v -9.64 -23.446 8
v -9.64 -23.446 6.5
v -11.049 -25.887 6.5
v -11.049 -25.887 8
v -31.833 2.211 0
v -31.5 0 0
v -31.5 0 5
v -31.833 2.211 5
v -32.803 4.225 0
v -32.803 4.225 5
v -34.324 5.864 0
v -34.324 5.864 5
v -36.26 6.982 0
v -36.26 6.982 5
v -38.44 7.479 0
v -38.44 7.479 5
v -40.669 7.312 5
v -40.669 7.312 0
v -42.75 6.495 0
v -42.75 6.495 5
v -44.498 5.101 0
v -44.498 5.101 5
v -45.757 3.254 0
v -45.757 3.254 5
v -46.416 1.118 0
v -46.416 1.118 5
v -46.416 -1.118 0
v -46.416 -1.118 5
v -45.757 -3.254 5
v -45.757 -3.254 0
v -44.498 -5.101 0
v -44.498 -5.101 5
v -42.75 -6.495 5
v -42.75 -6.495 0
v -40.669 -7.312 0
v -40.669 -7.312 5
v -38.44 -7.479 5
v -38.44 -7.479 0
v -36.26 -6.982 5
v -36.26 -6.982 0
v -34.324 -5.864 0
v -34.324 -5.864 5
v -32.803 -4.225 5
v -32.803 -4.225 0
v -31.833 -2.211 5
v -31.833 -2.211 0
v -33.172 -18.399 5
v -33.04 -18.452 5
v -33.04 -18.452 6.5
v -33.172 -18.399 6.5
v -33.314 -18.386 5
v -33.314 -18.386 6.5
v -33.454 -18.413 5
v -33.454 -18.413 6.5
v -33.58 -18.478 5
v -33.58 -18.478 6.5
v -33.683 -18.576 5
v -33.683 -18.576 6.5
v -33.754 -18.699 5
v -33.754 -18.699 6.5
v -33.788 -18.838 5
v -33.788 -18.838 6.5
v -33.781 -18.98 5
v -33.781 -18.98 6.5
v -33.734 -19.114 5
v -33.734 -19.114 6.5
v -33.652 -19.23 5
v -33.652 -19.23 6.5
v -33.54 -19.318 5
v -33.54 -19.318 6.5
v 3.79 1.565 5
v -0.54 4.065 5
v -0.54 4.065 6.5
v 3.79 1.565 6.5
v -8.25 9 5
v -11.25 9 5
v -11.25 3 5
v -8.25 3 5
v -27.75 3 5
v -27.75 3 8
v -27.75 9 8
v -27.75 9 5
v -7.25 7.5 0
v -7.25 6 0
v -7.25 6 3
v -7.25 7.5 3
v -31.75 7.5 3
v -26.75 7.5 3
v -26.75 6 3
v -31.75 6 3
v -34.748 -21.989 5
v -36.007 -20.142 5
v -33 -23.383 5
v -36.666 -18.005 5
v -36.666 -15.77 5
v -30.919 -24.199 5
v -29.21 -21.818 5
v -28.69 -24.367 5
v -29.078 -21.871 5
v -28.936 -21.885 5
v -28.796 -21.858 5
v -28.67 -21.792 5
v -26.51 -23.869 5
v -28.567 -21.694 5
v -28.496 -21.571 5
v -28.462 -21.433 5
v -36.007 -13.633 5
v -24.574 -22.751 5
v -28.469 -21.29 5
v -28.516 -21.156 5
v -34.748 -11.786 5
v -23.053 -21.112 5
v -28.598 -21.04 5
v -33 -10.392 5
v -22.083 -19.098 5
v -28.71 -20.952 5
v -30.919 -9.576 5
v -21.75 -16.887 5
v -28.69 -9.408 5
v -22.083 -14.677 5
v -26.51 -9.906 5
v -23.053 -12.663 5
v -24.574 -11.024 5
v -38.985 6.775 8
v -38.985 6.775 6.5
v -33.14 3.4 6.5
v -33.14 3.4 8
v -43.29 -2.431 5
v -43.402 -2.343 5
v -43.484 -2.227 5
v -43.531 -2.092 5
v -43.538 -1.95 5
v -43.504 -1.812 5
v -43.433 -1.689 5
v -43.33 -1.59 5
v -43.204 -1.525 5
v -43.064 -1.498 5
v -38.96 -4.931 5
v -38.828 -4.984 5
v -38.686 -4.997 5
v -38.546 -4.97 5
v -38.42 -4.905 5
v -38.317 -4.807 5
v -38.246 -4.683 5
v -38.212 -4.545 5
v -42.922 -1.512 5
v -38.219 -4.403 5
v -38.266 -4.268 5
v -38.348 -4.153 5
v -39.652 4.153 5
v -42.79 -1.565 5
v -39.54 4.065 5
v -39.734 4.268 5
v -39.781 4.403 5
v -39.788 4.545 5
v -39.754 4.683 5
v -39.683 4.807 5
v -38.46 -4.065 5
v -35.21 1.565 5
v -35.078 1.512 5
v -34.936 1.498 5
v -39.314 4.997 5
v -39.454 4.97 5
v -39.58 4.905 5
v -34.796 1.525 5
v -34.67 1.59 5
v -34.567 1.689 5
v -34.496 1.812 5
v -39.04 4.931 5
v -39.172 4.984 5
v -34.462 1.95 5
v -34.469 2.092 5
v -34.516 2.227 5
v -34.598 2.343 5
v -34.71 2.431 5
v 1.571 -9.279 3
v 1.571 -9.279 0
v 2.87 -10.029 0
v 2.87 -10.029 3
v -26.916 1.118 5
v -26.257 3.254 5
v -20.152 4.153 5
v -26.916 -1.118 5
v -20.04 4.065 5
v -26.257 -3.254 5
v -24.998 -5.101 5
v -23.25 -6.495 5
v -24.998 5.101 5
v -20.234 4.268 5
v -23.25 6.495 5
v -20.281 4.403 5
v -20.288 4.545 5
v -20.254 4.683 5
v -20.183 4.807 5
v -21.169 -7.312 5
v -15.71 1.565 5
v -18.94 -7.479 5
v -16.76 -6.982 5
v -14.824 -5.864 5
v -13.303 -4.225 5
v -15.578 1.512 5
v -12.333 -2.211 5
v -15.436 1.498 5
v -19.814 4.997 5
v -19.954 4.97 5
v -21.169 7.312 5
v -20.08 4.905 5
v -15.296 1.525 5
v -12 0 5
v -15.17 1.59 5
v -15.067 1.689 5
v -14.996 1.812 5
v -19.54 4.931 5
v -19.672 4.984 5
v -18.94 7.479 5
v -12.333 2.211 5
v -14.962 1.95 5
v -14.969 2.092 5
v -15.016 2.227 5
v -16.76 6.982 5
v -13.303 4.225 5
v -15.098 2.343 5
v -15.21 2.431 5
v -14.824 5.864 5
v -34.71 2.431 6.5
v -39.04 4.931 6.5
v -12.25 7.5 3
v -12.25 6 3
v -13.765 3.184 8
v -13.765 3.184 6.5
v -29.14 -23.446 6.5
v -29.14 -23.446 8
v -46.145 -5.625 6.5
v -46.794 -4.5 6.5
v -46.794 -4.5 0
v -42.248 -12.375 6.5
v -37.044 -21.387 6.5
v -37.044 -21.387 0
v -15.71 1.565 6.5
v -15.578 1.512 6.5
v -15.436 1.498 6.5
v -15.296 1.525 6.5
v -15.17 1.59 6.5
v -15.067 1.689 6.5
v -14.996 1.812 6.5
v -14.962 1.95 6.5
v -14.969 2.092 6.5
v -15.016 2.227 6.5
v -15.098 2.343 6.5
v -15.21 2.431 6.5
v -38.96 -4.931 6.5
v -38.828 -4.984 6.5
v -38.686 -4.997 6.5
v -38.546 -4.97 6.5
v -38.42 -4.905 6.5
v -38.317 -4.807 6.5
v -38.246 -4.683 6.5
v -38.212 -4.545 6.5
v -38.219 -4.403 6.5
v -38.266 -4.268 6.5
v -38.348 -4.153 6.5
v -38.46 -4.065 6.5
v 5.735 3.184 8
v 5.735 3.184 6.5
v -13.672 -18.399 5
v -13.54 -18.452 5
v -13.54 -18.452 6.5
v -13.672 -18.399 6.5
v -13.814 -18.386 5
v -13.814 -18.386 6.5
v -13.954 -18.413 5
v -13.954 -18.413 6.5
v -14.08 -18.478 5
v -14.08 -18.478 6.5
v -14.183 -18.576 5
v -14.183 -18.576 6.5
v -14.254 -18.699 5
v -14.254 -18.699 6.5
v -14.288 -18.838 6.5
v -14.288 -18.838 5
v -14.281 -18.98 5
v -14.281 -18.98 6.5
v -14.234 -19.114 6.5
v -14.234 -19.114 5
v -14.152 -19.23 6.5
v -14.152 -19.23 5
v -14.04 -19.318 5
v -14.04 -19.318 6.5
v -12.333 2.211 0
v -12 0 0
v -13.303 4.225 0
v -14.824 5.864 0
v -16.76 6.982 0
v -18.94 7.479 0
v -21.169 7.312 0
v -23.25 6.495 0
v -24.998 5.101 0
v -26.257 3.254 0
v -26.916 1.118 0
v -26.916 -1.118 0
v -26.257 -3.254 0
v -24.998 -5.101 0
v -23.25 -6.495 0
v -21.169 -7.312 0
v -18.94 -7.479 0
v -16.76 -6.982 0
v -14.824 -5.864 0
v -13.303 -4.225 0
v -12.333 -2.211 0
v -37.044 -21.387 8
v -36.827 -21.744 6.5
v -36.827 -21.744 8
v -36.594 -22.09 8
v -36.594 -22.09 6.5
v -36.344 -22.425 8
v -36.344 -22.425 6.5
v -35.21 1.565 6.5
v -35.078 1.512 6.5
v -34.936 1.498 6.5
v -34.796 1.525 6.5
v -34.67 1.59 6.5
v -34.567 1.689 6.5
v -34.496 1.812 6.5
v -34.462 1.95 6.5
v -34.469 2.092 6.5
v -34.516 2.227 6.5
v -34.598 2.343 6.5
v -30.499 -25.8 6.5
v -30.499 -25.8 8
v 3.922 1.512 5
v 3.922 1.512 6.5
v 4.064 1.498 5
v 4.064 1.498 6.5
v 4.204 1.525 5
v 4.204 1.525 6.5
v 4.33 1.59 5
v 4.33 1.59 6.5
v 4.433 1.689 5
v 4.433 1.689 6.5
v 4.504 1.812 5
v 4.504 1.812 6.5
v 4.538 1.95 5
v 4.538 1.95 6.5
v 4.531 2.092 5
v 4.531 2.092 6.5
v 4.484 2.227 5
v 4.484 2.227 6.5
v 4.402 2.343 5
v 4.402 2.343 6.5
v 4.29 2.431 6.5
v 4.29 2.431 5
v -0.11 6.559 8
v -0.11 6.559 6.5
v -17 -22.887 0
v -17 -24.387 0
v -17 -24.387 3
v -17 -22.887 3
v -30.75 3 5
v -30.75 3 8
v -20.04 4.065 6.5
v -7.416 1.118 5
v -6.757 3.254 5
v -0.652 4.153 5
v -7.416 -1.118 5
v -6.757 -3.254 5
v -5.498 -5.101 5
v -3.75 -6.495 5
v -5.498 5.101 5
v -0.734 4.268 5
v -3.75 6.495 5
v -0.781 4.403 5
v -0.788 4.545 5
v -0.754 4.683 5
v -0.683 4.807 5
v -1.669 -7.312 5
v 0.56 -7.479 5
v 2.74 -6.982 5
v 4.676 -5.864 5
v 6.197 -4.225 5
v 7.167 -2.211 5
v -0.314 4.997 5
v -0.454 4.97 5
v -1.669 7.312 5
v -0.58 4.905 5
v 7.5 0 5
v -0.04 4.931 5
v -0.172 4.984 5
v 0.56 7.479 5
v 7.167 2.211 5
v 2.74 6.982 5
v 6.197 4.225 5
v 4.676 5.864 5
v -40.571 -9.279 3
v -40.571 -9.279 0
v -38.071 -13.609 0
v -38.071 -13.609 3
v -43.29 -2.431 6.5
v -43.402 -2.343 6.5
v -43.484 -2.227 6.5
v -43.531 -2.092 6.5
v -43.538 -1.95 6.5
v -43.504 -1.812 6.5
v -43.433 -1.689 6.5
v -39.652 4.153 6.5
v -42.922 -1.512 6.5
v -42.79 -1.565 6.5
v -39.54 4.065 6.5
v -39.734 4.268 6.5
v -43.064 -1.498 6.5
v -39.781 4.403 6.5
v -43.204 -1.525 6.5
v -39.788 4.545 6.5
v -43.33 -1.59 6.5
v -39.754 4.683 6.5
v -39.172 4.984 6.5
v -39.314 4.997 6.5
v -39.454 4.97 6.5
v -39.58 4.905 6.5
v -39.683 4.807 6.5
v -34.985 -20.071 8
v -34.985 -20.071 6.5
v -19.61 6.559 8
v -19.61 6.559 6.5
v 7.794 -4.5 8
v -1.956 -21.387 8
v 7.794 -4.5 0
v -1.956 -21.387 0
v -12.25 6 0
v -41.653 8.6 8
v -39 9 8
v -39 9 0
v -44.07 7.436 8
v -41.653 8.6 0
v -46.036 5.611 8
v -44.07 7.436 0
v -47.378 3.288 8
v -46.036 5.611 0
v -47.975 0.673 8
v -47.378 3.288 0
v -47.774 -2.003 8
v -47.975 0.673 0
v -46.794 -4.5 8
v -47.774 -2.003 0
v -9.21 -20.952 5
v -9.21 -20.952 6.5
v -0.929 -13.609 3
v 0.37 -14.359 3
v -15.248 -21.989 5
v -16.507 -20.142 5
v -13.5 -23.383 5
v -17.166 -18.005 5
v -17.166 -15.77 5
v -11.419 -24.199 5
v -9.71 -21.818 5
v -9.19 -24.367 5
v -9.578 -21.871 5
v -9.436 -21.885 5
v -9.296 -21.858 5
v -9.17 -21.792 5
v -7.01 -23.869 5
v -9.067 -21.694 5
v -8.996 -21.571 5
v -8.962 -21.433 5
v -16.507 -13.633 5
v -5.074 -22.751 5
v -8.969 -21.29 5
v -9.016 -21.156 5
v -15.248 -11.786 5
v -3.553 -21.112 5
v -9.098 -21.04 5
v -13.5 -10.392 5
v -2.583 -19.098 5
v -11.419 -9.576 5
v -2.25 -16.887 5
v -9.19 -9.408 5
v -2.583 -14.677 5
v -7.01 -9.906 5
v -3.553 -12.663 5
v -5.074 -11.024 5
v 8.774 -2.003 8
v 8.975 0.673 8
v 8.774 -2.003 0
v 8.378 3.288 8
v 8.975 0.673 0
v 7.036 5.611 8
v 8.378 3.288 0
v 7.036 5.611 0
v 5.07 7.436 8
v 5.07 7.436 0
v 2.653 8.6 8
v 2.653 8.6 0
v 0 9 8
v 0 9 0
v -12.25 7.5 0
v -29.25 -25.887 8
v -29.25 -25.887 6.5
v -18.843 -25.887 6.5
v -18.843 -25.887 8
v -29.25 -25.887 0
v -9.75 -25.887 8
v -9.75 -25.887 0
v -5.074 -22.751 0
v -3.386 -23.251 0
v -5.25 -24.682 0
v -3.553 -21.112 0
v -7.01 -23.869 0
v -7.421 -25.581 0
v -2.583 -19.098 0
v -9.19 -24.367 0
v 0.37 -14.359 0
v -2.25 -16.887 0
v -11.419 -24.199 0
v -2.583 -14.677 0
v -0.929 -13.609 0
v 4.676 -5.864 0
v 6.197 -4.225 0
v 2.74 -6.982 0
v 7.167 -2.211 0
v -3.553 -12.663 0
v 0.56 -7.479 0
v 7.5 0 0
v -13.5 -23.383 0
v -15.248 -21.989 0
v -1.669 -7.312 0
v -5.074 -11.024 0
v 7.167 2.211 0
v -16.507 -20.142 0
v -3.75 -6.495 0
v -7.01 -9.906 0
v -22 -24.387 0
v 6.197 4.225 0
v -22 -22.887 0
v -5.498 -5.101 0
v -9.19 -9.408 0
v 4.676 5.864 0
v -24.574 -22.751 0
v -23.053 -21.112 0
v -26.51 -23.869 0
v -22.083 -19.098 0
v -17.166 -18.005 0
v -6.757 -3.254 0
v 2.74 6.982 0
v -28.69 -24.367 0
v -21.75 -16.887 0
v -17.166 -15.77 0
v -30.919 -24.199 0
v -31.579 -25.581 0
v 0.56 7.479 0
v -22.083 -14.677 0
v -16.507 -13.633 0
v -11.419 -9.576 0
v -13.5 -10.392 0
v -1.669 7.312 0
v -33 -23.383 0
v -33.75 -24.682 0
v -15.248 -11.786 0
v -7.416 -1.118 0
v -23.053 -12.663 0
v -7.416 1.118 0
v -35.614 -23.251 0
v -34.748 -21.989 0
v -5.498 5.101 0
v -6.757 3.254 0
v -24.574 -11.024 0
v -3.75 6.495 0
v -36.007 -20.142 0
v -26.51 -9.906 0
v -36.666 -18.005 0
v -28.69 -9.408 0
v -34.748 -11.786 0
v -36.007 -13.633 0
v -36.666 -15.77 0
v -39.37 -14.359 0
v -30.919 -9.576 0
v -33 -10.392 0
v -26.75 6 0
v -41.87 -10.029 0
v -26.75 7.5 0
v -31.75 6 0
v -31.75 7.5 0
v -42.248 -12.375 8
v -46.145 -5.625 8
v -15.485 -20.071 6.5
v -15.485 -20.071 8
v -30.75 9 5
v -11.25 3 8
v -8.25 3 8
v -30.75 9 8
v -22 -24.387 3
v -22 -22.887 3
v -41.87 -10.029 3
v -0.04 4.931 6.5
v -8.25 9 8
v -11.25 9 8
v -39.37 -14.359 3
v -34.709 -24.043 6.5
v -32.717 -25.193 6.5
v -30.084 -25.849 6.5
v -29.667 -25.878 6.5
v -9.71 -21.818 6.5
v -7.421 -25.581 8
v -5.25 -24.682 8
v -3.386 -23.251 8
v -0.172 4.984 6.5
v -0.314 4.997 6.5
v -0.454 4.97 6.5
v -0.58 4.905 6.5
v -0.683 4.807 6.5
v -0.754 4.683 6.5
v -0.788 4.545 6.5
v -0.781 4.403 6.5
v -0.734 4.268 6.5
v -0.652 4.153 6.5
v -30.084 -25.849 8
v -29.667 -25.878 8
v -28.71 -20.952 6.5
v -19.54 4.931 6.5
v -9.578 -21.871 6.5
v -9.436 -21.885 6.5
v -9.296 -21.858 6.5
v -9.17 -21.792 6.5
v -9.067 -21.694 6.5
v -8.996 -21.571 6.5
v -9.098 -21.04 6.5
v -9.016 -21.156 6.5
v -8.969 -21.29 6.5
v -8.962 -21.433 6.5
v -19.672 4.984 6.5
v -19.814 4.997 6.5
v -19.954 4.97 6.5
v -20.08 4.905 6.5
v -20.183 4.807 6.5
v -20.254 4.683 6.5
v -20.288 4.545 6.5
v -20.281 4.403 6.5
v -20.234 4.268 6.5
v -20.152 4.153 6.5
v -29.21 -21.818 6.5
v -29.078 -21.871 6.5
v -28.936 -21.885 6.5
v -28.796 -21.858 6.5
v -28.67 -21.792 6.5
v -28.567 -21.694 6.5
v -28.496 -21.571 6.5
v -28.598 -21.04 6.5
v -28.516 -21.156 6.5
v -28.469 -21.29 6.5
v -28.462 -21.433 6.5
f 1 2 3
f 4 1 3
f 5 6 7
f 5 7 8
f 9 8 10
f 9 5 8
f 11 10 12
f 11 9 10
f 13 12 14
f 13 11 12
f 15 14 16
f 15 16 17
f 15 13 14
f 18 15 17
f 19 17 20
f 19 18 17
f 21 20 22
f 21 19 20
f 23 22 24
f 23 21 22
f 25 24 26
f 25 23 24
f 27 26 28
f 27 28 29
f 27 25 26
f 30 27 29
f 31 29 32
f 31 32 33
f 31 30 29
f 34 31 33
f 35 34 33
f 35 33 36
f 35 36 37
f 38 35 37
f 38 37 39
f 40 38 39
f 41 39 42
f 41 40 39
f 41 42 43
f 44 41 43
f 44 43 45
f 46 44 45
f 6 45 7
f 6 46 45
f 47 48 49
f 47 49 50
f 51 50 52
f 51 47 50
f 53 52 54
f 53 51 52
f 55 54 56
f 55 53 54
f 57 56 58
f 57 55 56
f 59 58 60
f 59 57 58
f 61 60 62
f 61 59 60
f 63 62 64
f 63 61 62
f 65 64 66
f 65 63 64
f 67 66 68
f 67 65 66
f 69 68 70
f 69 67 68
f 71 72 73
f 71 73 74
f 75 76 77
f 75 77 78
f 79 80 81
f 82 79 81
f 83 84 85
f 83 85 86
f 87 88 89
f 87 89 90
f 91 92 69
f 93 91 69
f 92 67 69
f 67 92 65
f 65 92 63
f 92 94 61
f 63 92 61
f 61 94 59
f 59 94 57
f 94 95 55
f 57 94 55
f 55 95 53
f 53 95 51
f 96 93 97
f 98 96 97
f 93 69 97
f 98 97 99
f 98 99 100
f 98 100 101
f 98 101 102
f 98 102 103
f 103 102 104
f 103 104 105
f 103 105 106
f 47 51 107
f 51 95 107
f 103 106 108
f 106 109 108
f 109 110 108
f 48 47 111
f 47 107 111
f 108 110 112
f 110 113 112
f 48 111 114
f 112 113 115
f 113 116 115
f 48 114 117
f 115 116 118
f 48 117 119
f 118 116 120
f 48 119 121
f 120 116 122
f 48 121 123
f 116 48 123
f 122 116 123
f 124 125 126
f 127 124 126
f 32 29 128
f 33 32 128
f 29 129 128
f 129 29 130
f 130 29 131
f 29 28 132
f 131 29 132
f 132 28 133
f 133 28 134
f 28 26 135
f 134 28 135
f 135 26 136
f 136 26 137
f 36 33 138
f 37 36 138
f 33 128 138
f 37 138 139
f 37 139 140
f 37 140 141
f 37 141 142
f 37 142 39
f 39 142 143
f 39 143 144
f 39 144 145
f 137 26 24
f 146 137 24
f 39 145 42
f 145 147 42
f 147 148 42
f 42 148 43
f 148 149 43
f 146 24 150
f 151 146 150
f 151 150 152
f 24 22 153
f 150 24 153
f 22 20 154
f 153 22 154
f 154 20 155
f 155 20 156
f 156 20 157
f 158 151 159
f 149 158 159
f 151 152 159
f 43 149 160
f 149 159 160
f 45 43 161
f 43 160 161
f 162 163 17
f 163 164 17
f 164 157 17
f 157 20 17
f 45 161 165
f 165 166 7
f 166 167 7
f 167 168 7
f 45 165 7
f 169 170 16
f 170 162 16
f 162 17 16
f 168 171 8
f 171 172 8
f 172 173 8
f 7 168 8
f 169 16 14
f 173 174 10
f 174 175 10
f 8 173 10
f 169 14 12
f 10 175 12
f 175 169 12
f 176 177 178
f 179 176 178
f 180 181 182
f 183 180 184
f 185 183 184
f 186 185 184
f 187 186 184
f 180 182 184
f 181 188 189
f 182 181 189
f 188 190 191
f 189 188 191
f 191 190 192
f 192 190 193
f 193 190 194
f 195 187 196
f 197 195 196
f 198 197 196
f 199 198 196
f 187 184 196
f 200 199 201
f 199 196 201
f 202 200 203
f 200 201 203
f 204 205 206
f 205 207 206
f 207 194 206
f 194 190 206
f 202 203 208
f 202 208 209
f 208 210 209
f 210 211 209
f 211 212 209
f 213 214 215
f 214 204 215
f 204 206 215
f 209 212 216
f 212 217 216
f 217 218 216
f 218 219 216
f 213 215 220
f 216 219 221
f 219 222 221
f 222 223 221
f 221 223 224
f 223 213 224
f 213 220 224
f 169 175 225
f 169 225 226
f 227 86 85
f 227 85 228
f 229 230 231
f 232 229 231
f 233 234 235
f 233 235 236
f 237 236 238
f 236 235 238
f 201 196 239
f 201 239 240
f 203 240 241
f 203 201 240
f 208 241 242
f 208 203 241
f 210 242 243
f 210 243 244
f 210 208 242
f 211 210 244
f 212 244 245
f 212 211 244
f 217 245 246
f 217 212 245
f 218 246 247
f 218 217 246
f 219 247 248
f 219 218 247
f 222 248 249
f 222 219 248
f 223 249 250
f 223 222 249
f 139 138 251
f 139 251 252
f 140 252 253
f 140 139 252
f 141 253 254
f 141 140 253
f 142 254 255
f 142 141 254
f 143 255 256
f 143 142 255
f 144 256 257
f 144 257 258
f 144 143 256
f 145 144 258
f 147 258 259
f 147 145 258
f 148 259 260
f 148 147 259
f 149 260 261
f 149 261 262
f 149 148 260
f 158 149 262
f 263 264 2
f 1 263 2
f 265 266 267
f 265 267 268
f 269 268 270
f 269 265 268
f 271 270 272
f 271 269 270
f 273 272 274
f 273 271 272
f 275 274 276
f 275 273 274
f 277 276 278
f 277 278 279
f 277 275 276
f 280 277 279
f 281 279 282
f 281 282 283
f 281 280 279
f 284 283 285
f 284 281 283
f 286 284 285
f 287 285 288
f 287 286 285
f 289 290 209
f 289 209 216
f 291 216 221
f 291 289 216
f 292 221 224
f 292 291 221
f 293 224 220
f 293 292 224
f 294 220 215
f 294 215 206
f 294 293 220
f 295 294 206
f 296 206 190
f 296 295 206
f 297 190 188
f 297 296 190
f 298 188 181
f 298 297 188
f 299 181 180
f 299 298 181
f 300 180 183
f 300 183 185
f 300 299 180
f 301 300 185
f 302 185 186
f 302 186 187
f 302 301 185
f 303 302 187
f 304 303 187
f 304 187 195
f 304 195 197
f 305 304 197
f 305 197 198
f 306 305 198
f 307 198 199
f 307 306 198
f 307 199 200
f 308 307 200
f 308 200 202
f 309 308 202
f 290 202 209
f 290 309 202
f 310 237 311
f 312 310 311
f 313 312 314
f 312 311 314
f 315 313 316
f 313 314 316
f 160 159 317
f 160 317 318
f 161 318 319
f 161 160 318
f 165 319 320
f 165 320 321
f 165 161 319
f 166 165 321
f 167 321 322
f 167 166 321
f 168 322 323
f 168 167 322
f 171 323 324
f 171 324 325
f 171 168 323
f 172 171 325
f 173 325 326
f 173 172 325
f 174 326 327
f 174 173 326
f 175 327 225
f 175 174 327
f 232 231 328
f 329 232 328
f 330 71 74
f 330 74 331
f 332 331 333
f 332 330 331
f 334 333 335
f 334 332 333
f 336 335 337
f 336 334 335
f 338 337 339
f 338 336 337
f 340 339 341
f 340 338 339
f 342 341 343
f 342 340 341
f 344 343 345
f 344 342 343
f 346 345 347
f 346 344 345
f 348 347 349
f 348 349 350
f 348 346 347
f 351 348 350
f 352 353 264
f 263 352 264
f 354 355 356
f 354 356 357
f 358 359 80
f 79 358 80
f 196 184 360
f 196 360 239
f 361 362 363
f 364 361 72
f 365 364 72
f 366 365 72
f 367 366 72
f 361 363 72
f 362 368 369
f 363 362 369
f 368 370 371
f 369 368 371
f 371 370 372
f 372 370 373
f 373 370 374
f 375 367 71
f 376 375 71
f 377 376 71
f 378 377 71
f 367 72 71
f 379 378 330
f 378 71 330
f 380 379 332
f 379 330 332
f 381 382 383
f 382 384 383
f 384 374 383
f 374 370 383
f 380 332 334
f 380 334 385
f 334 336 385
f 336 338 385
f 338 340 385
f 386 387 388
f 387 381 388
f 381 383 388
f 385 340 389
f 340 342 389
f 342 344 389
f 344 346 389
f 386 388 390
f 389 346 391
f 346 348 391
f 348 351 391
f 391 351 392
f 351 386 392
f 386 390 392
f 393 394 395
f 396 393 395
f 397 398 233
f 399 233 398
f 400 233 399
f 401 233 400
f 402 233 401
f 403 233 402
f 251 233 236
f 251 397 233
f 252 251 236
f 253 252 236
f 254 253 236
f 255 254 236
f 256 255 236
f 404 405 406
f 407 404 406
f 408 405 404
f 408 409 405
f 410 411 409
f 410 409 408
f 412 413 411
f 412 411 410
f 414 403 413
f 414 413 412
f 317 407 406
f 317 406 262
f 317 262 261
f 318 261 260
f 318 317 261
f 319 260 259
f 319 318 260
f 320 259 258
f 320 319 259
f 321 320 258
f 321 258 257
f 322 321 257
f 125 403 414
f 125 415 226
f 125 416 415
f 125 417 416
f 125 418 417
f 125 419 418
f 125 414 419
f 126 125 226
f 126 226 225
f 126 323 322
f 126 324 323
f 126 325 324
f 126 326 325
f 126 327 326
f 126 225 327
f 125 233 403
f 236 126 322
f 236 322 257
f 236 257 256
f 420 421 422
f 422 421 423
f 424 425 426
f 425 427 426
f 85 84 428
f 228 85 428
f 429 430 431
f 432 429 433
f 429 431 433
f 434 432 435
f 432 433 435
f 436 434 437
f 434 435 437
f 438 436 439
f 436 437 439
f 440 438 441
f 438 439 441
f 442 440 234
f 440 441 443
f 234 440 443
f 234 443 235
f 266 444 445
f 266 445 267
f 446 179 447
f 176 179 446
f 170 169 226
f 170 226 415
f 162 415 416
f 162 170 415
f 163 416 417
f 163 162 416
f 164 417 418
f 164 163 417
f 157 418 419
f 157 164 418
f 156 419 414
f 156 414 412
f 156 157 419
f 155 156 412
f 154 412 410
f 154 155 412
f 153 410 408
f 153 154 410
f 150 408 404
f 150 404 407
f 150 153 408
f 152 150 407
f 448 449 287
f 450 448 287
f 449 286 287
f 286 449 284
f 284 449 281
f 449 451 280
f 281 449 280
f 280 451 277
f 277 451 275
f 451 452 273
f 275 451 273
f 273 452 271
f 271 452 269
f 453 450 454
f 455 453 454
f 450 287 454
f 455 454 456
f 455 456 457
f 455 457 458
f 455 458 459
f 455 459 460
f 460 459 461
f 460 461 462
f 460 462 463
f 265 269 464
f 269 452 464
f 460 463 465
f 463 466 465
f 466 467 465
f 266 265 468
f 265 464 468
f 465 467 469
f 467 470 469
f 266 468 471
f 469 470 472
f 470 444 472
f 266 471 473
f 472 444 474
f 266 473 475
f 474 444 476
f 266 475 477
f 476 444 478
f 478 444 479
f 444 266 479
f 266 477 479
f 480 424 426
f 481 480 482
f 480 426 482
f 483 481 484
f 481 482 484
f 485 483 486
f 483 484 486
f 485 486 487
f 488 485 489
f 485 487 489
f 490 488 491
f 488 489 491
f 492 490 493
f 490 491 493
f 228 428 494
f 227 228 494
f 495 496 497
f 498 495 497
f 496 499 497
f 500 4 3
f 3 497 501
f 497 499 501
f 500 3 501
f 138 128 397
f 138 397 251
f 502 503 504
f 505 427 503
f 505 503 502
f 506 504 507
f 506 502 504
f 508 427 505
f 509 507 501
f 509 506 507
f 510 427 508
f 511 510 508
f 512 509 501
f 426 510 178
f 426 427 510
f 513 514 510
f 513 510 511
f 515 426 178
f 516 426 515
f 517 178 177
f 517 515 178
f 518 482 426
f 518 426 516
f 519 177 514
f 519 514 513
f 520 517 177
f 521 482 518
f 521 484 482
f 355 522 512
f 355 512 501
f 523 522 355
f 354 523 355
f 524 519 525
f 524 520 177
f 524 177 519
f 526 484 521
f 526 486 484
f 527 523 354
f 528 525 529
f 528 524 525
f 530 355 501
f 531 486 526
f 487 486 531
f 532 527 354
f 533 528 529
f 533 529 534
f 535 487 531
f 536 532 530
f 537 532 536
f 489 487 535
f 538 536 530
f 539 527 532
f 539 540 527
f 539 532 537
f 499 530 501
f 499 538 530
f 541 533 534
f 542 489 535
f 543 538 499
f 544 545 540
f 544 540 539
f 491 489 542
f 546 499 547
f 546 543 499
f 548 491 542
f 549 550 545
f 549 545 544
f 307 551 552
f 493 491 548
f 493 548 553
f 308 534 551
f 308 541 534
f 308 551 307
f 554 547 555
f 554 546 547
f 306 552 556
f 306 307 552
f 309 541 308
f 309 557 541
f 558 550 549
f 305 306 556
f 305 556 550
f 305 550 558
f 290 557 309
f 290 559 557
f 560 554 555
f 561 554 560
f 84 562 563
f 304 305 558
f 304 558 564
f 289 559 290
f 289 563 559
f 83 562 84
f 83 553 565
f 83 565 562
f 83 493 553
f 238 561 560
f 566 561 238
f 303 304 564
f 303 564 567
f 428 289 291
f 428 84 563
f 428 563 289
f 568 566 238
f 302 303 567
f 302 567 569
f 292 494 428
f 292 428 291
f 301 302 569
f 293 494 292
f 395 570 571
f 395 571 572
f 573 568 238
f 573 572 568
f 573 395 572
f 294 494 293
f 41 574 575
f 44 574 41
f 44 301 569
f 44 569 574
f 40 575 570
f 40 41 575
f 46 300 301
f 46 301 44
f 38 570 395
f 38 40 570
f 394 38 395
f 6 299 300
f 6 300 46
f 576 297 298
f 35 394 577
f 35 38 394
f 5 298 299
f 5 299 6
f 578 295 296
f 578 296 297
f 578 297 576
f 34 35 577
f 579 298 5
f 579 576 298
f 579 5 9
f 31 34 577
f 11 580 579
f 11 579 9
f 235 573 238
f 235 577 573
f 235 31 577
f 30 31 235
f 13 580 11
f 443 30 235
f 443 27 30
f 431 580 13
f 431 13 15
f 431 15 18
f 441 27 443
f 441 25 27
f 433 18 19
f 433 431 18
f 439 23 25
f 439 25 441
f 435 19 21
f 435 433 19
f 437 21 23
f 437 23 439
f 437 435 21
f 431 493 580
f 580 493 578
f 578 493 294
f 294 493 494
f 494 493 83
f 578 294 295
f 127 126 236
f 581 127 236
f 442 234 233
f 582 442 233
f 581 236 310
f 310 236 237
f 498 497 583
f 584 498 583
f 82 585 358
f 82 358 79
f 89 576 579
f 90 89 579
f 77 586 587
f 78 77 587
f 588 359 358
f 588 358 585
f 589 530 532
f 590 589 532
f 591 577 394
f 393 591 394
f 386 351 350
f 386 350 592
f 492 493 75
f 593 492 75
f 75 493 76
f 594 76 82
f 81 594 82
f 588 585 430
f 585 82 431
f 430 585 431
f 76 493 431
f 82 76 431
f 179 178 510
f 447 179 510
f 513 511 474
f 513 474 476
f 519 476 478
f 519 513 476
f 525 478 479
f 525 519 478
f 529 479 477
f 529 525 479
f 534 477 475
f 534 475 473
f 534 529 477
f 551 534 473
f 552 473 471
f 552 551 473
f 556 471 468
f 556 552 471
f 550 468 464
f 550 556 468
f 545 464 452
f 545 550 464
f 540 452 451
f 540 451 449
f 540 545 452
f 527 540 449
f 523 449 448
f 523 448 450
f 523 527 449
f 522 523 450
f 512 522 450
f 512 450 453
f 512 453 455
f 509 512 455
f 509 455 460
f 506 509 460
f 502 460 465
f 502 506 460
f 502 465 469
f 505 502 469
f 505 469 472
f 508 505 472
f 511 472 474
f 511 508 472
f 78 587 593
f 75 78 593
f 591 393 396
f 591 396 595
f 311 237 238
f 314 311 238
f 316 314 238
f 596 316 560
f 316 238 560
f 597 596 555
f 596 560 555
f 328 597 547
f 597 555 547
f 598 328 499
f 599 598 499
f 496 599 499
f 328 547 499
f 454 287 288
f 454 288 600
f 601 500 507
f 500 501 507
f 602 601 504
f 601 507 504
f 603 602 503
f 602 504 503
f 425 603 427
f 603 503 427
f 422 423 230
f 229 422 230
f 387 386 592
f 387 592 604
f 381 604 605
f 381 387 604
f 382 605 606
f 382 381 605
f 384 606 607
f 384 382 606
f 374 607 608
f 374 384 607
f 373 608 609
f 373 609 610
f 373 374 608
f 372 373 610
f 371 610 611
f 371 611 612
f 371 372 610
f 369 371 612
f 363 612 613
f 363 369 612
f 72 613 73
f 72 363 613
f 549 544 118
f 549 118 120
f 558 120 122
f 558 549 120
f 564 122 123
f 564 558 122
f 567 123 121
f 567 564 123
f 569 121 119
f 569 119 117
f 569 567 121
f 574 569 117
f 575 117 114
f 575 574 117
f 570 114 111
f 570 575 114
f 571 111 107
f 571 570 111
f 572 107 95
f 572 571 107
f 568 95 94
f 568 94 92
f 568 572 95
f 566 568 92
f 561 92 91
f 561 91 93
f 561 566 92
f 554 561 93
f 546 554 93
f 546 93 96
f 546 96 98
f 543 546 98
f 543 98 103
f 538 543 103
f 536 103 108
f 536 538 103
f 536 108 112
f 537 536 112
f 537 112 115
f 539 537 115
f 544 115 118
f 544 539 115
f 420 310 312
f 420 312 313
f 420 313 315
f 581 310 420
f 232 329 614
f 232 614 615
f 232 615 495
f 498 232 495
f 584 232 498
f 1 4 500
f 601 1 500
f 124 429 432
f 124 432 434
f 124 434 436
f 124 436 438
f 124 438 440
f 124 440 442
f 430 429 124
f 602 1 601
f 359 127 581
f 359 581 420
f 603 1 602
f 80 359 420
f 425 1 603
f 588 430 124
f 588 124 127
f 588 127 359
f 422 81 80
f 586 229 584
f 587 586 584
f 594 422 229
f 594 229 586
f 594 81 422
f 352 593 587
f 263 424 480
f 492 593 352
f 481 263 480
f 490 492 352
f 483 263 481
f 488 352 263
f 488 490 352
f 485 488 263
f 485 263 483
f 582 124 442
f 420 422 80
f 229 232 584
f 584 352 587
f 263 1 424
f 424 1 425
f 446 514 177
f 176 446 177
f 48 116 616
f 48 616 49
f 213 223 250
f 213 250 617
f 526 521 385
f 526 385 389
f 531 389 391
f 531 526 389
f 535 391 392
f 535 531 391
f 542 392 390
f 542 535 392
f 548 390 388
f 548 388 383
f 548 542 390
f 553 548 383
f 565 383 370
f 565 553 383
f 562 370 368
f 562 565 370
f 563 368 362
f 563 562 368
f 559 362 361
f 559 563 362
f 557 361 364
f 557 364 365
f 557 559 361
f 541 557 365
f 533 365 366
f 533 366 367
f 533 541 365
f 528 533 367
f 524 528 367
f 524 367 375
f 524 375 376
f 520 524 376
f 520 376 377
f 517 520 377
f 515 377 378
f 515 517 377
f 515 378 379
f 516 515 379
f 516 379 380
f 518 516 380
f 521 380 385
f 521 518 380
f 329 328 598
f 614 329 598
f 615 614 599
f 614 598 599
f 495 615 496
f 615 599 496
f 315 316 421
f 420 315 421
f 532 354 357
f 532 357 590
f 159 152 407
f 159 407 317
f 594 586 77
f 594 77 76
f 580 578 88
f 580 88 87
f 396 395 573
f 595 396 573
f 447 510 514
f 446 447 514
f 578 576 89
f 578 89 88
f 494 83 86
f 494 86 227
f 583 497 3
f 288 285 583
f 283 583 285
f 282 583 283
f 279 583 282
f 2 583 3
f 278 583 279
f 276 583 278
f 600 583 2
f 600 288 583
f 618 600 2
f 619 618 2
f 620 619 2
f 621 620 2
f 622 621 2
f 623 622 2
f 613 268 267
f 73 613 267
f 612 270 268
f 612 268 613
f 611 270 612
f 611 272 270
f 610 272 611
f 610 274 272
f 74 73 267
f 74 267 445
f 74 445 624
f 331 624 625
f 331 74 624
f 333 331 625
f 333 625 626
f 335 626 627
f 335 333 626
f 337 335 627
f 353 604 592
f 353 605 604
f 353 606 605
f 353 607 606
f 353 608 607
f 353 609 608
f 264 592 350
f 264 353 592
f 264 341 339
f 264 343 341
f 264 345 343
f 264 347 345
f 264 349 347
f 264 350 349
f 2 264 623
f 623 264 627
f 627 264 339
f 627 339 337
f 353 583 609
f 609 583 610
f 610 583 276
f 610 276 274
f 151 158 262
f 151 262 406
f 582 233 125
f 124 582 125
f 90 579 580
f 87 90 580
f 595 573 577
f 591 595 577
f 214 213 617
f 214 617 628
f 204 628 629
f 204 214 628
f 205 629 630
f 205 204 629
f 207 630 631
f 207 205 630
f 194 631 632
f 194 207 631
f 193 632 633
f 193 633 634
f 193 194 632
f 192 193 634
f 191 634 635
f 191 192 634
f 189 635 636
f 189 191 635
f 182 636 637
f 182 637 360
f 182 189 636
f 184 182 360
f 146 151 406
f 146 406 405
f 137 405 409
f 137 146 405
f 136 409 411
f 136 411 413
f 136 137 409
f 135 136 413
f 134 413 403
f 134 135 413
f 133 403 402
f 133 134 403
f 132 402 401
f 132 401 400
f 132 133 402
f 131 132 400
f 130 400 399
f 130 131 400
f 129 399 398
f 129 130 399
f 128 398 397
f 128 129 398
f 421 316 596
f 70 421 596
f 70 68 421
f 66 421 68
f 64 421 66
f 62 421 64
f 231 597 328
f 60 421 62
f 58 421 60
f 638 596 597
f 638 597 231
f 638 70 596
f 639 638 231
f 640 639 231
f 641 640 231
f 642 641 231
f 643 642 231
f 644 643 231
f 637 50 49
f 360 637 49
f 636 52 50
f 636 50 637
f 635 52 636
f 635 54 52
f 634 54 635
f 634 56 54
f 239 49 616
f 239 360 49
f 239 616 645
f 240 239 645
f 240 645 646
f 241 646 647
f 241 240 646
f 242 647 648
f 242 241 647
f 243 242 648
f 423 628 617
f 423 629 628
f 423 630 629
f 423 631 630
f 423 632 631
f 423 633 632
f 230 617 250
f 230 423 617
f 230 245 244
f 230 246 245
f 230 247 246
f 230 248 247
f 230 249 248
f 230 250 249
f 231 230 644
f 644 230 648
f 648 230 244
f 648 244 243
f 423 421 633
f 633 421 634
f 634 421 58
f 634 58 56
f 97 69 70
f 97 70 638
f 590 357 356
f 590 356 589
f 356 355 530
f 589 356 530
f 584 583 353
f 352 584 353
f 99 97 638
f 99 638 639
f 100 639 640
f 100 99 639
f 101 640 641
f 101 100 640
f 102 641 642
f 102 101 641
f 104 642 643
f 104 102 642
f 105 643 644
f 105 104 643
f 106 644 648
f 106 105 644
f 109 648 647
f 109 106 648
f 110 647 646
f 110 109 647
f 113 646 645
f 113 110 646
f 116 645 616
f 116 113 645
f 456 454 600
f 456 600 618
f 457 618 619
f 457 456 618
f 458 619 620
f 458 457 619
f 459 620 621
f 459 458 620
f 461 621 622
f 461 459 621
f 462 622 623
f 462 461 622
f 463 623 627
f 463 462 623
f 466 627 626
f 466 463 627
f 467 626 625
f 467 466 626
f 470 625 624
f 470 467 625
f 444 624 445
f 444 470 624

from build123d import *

# Parameters (mm, degrees)
SKETCH1_R           = 7.5
BOSS_EXTRUDE1_DEPTH = 5
SKETCH2_R           = 7.5
BOSS_EXTRUDE2_DEPTH = 1.5
BOSS_EXTRUDE3_DEPTH = 1.5
SKETCH9_W           = 3
SKETCH9_H           = 6
CUT_EXTRUDE4_DEPTH  = 3
SKETCH4_W           = 5
SKETCH4_H           = 1.5
CUT_EXTRUDE5_DEPTH  = 3


with BuildPart() as part:
    # Sketch1 → Boss-Extrude1 (new body)
    with BuildSketch(Plane.XY):
        with BuildLine():
            Line((7.794228634, -4.5), (-1.955771366, -21.387495374))
            ThreePointArc((-1.955771366, -21.387495374), (-5.25, -24.681724008), (-9.75, -25.887495374))
            Line((-9.75, -25.887495374), (-29.25, -25.887495374))
            ThreePointArc((-29.25, -25.887495374), (-33.75, -24.681724008), (-37.044228634, -21.387495374))
            Line((-37.044228634, -21.387495374), (-46.794228634, -4.5))
            ThreePointArc((-46.794228634, -4.5), (-46.794228634, 4.5), (-39, 9))
            Line((-39, 9), (0, 9))
            ThreePointArc((0, 9), (7.794228634, 4.5), (7.794228634, -4.5))
        make_face()
        with Locations((-29.25, -16.887495374)):
            Circle(SKETCH1_R, mode=Mode.SUBTRACT)
        with Locations((-19.5, 0)):
            Circle(SKETCH1_R, mode=Mode.SUBTRACT)
        Circle(SKETCH1_R, mode=Mode.SUBTRACT)
        with Locations((-9.75, -16.887495374)):
            Circle(SKETCH1_R, mode=Mode.SUBTRACT)
        with Locations((-39, 0)):
            Circle(SKETCH1_R, mode=Mode.SUBTRACT)
    extrude(amount=BOSS_EXTRUDE1_DEPTH)

    # Sketch2 → Boss-Extrude2 (add)
    # profile 1 of 6: a face of its own
    with BuildSketch(Plane.XY.offset(5)):
        with BuildLine():
            Line((-1.955771366, -21.387495374), (7.794228634, -4.5))
            ThreePointArc((7.794228634, -4.5), (7.794228634, 4.5), (0, 9))
            Line((0, 9), (-39, 9))
            ThreePointArc((-39, 9), (-46.794228634, 4.5), (-46.794228634, -4.5))
            Line((-46.794228634, -4.5), (-37.044228634, -21.387495374))
            ThreePointArc((-37.044228634, -21.387495374), (-33.75, -24.681724008), (-29.25, -25.887495374))
            Line((-29.25, -25.887495374), (-9.75, -25.887495374))
            ThreePointArc((-9.75, -25.887495374), (-5.25, -24.681724008), (-1.955771366, -21.387495374))
        make_face()
        Circle(SKETCH2_R, mode=Mode.SUBTRACT)
        with Locations((-19.5, 0)):
            Circle(SKETCH2_R, mode=Mode.SUBTRACT)
        with Locations((-39, 0)):
            Circle(SKETCH2_R, mode=Mode.SUBTRACT)
        with Locations((-29.25, -16.887495374)):
            Circle(SKETCH2_R, mode=Mode.SUBTRACT)
        with Locations((-9.75, -16.887495374)):
            Circle(SKETCH2_R, mode=Mode.SUBTRACT)
    # profile 2 of 6: a face of its own
    with BuildSketch(Plane.XY.offset(5)):
        with Locations((-9.75, -16.887495374)):
            Circle(SKETCH2_R)
        with BuildLine():
            ThreePointArc((-13.540063509, -18.452077936), (-14.223076211, -18.635090638), (-14.040063509, -19.31810334))
            Line((-14.040063509, -19.31810334), (-9.709936491, -21.81810334))
            ThreePointArc((-9.709936491, -21.81810334), (-9.026923789, -21.635090638), (-9.209936491, -20.952077936))
            Line((-9.209936491, -20.952077936), (-13.540063509, -18.452077936))
        make_face(mode=Mode.SUBTRACT)
    # profile 3 of 6: a face of its own
    with BuildSketch(Plane.XY.offset(5)):
        Circle(SKETCH2_R)
        with BuildLine():
            ThreePointArc((-0.040063509, 4.930607966), (-0.723076211, 4.747595264), (-0.540063509, 4.064582562))
            Line((-0.540063509, 4.064582562), (3.790063509, 1.564582562))
            ThreePointArc((3.790063509, 1.564582562), (4.473076211, 1.747595264), (4.290063509, 2.430607966))
            Line((4.290063509, 2.430607966), (-0.040063509, 4.930607966))
        make_face(mode=Mode.SUBTRACT)
    # profile 4 of 6: a face of its own
    with BuildSketch(Plane.XY.offset(5)):
        with Locations((-19.5, 0)):
            Circle(SKETCH2_R)
        with BuildLine():
            ThreePointArc((-19.540063509, 4.930607966), (-20.223076211, 4.747595264), (-20.040063509, 4.064582562))
            Line((-20.040063509, 4.064582562), (-15.709936491, 1.564582562))
            ThreePointArc((-15.709936491, 1.564582562), (-15.026923789, 1.747595264), (-15.209936491, 2.430607966))
            Line((-15.209936491, 2.430607966), (-19.540063509, 4.930607966))
        make_face(mode=Mode.SUBTRACT)
    # profile 5 of 6: a face of its own
    with BuildSketch(Plane.XY.offset(5)):
        with Locations((-29.25, -16.887495374)):
            Circle(SKETCH2_R)
        with BuildLine():
            ThreePointArc((-33.040063509, -18.452077936), (-33.723076211, -18.635090638), (-33.540063509, -19.31810334))
            Line((-33.540063509, -19.31810334), (-29.209936491, -21.81810334))
            ThreePointArc((-29.209936491, -21.81810334), (-28.526923789, -21.635090638), (-28.709936491, -20.952077936))
            Line((-28.709936491, -20.952077936), (-33.040063509, -18.452077936))
        make_face(mode=Mode.SUBTRACT)
    # profile 6 of 6: a face of its own
    with BuildSketch(Plane.XY.offset(5)):
        with Locations((-39, 0)):
            Circle(SKETCH2_R)
        with BuildLine():
            ThreePointArc((-42.790063509, -1.564582562), (-43.473076211, -1.747595264), (-43.290063509, -2.430607966))
            Line((-43.290063509, -2.430607966), (-38.959936491, -4.930607966))
            ThreePointArc((-38.959936491, -4.930607966), (-38.276923789, -4.747595264), (-38.459936491, -4.064582562))
            Line((-38.459936491, -4.064582562), (-42.790063509, -1.564582562))
        make_face(mode=Mode.SUBTRACT)
        with BuildLine():
            ThreePointArc((-39.040063509, 4.930607966), (-39.723076211, 4.747595264), (-39.540063509, 4.064582562))
            Line((-39.540063509, 4.064582562), (-35.209936491, 1.564582562))
            ThreePointArc((-35.209936491, 1.564582562), (-34.526923789, 1.747595264), (-34.709936491, 2.430607966))
            Line((-34.709936491, 2.430607966), (-39.040063509, 4.930607966))
        make_face(mode=Mode.SUBTRACT)
    extrude(amount=BOSS_EXTRUDE2_DEPTH)

    # Sketch3 → Boss-Extrude3 (add)
    with BuildSketch(Plane.XY.offset(6.5)):
        with BuildLine():
            ThreePointArc((-39, 9), (-46.794228634, 4.5), (-46.794228634, -4.5))
            Line((-46.794228634, -4.5), (-46.144709581, -5.625))
            Line((-46.144709581, -5.625), (-38.985335738, 6.775399247))
            Line((-38.985335738, 6.775399247), (-33.139664262, 3.400399247))
            Line((-33.139664262, 3.400399247), (-42.247595264, -12.375))
            Line((-42.247595264, -12.375), (-37.044228634, -21.387495374))
            ThreePointArc((-37.044228634, -21.387495374), (-36.712405778, -21.918648323), (-36.344447387, -22.425438699))
            Line((-36.344447387, -22.425438699), (-34.985335738, -20.07138827))
            Line((-34.985335738, -20.07138827), (-19.610335738, 6.558892896))
            Line((-19.610335738, 6.558892896), (-13.764664262, 3.183892896))
            Line((-13.764664262, 3.183892896), (-29.139664262, -23.44638827))
            Line((-29.139664262, -23.44638827), (-30.498775911, -25.800438699))
            ThreePointArc((-30.498775911, -25.800438699), (-29.875903375, -25.865704826), (-29.25, -25.887495374))
            Line((-29.25, -25.887495374), (-18.84326674, -25.887495374))
            Line((-18.84326674, -25.887495374), (-15.485335738, -20.07138827))
            Line((-15.485335738, -20.07138827), (-0.110335738, 6.558892896))
            Line((-0.110335738, 6.558892896), (5.735335738, 3.183892896))
            Line((5.735335738, 3.183892896), (-9.639664262, -23.44638827))
            Line((-9.639664262, -23.44638827), (-11.049038106, -25.887495374))
            Line((-11.049038106, -25.887495374), (-9.75, -25.887495374))
            ThreePointArc((-9.75, -25.887495374), (-5.25, -24.681724008), (-1.955771366, -21.387495374))
            Line((-1.955771366, -21.387495374), (7.794228634, -4.5))
            ThreePointArc((7.794228634, -4.5), (7.794228634, 4.5), (0, 9))
            Line((0, 9), (-39, 9))
        make_face()
    extrude(amount=BOSS_EXTRUDE3_DEPTH)

    # Sketch9 → Cut-Extrude4 (cut)
    with BuildSketch(Plane.XY.offset(8)):
        with Locations((-29.25, 6)):
            Rectangle(SKETCH9_W, SKETCH9_H)
        with Locations((-9.75, 6)):
            Rectangle(SKETCH9_W, SKETCH9_H)
    extrude(amount=-CUT_EXTRUDE4_DEPTH, mode=Mode.SUBTRACT)

    # Sketch4 → Cut-Extrude5 (cut)
    with BuildSketch(Plane(origin=(0, 0, 0), x_dir=(-1, 0, 0), z_dir=(0, 0, -1))):
        Polygon((-2.870190528, -10.028684177), (-0.370190528, -14.358811196), (0.928847577, -13.608811196), (-1.571152423, -9.278684177), align=None)
        with Locations((9.75, 6.75)):
            Rectangle(SKETCH4_W, SKETCH4_H)
        with Locations((29.25, 6.75)):
            Rectangle(SKETCH4_W, SKETCH4_H)
        Polygon((39.370190528, -14.358811196), (41.870190528, -10.028684177), (40.571152423, -9.278684177), (38.071152423, -13.608811196), align=None)
        with Locations((19.5, -23.637495374)):
            Rectangle(SKETCH4_W, SKETCH4_H)
    extrude(amount=-CUT_EXTRUDE5_DEPTH, mode=Mode.SUBTRACT)


solid = part.part
